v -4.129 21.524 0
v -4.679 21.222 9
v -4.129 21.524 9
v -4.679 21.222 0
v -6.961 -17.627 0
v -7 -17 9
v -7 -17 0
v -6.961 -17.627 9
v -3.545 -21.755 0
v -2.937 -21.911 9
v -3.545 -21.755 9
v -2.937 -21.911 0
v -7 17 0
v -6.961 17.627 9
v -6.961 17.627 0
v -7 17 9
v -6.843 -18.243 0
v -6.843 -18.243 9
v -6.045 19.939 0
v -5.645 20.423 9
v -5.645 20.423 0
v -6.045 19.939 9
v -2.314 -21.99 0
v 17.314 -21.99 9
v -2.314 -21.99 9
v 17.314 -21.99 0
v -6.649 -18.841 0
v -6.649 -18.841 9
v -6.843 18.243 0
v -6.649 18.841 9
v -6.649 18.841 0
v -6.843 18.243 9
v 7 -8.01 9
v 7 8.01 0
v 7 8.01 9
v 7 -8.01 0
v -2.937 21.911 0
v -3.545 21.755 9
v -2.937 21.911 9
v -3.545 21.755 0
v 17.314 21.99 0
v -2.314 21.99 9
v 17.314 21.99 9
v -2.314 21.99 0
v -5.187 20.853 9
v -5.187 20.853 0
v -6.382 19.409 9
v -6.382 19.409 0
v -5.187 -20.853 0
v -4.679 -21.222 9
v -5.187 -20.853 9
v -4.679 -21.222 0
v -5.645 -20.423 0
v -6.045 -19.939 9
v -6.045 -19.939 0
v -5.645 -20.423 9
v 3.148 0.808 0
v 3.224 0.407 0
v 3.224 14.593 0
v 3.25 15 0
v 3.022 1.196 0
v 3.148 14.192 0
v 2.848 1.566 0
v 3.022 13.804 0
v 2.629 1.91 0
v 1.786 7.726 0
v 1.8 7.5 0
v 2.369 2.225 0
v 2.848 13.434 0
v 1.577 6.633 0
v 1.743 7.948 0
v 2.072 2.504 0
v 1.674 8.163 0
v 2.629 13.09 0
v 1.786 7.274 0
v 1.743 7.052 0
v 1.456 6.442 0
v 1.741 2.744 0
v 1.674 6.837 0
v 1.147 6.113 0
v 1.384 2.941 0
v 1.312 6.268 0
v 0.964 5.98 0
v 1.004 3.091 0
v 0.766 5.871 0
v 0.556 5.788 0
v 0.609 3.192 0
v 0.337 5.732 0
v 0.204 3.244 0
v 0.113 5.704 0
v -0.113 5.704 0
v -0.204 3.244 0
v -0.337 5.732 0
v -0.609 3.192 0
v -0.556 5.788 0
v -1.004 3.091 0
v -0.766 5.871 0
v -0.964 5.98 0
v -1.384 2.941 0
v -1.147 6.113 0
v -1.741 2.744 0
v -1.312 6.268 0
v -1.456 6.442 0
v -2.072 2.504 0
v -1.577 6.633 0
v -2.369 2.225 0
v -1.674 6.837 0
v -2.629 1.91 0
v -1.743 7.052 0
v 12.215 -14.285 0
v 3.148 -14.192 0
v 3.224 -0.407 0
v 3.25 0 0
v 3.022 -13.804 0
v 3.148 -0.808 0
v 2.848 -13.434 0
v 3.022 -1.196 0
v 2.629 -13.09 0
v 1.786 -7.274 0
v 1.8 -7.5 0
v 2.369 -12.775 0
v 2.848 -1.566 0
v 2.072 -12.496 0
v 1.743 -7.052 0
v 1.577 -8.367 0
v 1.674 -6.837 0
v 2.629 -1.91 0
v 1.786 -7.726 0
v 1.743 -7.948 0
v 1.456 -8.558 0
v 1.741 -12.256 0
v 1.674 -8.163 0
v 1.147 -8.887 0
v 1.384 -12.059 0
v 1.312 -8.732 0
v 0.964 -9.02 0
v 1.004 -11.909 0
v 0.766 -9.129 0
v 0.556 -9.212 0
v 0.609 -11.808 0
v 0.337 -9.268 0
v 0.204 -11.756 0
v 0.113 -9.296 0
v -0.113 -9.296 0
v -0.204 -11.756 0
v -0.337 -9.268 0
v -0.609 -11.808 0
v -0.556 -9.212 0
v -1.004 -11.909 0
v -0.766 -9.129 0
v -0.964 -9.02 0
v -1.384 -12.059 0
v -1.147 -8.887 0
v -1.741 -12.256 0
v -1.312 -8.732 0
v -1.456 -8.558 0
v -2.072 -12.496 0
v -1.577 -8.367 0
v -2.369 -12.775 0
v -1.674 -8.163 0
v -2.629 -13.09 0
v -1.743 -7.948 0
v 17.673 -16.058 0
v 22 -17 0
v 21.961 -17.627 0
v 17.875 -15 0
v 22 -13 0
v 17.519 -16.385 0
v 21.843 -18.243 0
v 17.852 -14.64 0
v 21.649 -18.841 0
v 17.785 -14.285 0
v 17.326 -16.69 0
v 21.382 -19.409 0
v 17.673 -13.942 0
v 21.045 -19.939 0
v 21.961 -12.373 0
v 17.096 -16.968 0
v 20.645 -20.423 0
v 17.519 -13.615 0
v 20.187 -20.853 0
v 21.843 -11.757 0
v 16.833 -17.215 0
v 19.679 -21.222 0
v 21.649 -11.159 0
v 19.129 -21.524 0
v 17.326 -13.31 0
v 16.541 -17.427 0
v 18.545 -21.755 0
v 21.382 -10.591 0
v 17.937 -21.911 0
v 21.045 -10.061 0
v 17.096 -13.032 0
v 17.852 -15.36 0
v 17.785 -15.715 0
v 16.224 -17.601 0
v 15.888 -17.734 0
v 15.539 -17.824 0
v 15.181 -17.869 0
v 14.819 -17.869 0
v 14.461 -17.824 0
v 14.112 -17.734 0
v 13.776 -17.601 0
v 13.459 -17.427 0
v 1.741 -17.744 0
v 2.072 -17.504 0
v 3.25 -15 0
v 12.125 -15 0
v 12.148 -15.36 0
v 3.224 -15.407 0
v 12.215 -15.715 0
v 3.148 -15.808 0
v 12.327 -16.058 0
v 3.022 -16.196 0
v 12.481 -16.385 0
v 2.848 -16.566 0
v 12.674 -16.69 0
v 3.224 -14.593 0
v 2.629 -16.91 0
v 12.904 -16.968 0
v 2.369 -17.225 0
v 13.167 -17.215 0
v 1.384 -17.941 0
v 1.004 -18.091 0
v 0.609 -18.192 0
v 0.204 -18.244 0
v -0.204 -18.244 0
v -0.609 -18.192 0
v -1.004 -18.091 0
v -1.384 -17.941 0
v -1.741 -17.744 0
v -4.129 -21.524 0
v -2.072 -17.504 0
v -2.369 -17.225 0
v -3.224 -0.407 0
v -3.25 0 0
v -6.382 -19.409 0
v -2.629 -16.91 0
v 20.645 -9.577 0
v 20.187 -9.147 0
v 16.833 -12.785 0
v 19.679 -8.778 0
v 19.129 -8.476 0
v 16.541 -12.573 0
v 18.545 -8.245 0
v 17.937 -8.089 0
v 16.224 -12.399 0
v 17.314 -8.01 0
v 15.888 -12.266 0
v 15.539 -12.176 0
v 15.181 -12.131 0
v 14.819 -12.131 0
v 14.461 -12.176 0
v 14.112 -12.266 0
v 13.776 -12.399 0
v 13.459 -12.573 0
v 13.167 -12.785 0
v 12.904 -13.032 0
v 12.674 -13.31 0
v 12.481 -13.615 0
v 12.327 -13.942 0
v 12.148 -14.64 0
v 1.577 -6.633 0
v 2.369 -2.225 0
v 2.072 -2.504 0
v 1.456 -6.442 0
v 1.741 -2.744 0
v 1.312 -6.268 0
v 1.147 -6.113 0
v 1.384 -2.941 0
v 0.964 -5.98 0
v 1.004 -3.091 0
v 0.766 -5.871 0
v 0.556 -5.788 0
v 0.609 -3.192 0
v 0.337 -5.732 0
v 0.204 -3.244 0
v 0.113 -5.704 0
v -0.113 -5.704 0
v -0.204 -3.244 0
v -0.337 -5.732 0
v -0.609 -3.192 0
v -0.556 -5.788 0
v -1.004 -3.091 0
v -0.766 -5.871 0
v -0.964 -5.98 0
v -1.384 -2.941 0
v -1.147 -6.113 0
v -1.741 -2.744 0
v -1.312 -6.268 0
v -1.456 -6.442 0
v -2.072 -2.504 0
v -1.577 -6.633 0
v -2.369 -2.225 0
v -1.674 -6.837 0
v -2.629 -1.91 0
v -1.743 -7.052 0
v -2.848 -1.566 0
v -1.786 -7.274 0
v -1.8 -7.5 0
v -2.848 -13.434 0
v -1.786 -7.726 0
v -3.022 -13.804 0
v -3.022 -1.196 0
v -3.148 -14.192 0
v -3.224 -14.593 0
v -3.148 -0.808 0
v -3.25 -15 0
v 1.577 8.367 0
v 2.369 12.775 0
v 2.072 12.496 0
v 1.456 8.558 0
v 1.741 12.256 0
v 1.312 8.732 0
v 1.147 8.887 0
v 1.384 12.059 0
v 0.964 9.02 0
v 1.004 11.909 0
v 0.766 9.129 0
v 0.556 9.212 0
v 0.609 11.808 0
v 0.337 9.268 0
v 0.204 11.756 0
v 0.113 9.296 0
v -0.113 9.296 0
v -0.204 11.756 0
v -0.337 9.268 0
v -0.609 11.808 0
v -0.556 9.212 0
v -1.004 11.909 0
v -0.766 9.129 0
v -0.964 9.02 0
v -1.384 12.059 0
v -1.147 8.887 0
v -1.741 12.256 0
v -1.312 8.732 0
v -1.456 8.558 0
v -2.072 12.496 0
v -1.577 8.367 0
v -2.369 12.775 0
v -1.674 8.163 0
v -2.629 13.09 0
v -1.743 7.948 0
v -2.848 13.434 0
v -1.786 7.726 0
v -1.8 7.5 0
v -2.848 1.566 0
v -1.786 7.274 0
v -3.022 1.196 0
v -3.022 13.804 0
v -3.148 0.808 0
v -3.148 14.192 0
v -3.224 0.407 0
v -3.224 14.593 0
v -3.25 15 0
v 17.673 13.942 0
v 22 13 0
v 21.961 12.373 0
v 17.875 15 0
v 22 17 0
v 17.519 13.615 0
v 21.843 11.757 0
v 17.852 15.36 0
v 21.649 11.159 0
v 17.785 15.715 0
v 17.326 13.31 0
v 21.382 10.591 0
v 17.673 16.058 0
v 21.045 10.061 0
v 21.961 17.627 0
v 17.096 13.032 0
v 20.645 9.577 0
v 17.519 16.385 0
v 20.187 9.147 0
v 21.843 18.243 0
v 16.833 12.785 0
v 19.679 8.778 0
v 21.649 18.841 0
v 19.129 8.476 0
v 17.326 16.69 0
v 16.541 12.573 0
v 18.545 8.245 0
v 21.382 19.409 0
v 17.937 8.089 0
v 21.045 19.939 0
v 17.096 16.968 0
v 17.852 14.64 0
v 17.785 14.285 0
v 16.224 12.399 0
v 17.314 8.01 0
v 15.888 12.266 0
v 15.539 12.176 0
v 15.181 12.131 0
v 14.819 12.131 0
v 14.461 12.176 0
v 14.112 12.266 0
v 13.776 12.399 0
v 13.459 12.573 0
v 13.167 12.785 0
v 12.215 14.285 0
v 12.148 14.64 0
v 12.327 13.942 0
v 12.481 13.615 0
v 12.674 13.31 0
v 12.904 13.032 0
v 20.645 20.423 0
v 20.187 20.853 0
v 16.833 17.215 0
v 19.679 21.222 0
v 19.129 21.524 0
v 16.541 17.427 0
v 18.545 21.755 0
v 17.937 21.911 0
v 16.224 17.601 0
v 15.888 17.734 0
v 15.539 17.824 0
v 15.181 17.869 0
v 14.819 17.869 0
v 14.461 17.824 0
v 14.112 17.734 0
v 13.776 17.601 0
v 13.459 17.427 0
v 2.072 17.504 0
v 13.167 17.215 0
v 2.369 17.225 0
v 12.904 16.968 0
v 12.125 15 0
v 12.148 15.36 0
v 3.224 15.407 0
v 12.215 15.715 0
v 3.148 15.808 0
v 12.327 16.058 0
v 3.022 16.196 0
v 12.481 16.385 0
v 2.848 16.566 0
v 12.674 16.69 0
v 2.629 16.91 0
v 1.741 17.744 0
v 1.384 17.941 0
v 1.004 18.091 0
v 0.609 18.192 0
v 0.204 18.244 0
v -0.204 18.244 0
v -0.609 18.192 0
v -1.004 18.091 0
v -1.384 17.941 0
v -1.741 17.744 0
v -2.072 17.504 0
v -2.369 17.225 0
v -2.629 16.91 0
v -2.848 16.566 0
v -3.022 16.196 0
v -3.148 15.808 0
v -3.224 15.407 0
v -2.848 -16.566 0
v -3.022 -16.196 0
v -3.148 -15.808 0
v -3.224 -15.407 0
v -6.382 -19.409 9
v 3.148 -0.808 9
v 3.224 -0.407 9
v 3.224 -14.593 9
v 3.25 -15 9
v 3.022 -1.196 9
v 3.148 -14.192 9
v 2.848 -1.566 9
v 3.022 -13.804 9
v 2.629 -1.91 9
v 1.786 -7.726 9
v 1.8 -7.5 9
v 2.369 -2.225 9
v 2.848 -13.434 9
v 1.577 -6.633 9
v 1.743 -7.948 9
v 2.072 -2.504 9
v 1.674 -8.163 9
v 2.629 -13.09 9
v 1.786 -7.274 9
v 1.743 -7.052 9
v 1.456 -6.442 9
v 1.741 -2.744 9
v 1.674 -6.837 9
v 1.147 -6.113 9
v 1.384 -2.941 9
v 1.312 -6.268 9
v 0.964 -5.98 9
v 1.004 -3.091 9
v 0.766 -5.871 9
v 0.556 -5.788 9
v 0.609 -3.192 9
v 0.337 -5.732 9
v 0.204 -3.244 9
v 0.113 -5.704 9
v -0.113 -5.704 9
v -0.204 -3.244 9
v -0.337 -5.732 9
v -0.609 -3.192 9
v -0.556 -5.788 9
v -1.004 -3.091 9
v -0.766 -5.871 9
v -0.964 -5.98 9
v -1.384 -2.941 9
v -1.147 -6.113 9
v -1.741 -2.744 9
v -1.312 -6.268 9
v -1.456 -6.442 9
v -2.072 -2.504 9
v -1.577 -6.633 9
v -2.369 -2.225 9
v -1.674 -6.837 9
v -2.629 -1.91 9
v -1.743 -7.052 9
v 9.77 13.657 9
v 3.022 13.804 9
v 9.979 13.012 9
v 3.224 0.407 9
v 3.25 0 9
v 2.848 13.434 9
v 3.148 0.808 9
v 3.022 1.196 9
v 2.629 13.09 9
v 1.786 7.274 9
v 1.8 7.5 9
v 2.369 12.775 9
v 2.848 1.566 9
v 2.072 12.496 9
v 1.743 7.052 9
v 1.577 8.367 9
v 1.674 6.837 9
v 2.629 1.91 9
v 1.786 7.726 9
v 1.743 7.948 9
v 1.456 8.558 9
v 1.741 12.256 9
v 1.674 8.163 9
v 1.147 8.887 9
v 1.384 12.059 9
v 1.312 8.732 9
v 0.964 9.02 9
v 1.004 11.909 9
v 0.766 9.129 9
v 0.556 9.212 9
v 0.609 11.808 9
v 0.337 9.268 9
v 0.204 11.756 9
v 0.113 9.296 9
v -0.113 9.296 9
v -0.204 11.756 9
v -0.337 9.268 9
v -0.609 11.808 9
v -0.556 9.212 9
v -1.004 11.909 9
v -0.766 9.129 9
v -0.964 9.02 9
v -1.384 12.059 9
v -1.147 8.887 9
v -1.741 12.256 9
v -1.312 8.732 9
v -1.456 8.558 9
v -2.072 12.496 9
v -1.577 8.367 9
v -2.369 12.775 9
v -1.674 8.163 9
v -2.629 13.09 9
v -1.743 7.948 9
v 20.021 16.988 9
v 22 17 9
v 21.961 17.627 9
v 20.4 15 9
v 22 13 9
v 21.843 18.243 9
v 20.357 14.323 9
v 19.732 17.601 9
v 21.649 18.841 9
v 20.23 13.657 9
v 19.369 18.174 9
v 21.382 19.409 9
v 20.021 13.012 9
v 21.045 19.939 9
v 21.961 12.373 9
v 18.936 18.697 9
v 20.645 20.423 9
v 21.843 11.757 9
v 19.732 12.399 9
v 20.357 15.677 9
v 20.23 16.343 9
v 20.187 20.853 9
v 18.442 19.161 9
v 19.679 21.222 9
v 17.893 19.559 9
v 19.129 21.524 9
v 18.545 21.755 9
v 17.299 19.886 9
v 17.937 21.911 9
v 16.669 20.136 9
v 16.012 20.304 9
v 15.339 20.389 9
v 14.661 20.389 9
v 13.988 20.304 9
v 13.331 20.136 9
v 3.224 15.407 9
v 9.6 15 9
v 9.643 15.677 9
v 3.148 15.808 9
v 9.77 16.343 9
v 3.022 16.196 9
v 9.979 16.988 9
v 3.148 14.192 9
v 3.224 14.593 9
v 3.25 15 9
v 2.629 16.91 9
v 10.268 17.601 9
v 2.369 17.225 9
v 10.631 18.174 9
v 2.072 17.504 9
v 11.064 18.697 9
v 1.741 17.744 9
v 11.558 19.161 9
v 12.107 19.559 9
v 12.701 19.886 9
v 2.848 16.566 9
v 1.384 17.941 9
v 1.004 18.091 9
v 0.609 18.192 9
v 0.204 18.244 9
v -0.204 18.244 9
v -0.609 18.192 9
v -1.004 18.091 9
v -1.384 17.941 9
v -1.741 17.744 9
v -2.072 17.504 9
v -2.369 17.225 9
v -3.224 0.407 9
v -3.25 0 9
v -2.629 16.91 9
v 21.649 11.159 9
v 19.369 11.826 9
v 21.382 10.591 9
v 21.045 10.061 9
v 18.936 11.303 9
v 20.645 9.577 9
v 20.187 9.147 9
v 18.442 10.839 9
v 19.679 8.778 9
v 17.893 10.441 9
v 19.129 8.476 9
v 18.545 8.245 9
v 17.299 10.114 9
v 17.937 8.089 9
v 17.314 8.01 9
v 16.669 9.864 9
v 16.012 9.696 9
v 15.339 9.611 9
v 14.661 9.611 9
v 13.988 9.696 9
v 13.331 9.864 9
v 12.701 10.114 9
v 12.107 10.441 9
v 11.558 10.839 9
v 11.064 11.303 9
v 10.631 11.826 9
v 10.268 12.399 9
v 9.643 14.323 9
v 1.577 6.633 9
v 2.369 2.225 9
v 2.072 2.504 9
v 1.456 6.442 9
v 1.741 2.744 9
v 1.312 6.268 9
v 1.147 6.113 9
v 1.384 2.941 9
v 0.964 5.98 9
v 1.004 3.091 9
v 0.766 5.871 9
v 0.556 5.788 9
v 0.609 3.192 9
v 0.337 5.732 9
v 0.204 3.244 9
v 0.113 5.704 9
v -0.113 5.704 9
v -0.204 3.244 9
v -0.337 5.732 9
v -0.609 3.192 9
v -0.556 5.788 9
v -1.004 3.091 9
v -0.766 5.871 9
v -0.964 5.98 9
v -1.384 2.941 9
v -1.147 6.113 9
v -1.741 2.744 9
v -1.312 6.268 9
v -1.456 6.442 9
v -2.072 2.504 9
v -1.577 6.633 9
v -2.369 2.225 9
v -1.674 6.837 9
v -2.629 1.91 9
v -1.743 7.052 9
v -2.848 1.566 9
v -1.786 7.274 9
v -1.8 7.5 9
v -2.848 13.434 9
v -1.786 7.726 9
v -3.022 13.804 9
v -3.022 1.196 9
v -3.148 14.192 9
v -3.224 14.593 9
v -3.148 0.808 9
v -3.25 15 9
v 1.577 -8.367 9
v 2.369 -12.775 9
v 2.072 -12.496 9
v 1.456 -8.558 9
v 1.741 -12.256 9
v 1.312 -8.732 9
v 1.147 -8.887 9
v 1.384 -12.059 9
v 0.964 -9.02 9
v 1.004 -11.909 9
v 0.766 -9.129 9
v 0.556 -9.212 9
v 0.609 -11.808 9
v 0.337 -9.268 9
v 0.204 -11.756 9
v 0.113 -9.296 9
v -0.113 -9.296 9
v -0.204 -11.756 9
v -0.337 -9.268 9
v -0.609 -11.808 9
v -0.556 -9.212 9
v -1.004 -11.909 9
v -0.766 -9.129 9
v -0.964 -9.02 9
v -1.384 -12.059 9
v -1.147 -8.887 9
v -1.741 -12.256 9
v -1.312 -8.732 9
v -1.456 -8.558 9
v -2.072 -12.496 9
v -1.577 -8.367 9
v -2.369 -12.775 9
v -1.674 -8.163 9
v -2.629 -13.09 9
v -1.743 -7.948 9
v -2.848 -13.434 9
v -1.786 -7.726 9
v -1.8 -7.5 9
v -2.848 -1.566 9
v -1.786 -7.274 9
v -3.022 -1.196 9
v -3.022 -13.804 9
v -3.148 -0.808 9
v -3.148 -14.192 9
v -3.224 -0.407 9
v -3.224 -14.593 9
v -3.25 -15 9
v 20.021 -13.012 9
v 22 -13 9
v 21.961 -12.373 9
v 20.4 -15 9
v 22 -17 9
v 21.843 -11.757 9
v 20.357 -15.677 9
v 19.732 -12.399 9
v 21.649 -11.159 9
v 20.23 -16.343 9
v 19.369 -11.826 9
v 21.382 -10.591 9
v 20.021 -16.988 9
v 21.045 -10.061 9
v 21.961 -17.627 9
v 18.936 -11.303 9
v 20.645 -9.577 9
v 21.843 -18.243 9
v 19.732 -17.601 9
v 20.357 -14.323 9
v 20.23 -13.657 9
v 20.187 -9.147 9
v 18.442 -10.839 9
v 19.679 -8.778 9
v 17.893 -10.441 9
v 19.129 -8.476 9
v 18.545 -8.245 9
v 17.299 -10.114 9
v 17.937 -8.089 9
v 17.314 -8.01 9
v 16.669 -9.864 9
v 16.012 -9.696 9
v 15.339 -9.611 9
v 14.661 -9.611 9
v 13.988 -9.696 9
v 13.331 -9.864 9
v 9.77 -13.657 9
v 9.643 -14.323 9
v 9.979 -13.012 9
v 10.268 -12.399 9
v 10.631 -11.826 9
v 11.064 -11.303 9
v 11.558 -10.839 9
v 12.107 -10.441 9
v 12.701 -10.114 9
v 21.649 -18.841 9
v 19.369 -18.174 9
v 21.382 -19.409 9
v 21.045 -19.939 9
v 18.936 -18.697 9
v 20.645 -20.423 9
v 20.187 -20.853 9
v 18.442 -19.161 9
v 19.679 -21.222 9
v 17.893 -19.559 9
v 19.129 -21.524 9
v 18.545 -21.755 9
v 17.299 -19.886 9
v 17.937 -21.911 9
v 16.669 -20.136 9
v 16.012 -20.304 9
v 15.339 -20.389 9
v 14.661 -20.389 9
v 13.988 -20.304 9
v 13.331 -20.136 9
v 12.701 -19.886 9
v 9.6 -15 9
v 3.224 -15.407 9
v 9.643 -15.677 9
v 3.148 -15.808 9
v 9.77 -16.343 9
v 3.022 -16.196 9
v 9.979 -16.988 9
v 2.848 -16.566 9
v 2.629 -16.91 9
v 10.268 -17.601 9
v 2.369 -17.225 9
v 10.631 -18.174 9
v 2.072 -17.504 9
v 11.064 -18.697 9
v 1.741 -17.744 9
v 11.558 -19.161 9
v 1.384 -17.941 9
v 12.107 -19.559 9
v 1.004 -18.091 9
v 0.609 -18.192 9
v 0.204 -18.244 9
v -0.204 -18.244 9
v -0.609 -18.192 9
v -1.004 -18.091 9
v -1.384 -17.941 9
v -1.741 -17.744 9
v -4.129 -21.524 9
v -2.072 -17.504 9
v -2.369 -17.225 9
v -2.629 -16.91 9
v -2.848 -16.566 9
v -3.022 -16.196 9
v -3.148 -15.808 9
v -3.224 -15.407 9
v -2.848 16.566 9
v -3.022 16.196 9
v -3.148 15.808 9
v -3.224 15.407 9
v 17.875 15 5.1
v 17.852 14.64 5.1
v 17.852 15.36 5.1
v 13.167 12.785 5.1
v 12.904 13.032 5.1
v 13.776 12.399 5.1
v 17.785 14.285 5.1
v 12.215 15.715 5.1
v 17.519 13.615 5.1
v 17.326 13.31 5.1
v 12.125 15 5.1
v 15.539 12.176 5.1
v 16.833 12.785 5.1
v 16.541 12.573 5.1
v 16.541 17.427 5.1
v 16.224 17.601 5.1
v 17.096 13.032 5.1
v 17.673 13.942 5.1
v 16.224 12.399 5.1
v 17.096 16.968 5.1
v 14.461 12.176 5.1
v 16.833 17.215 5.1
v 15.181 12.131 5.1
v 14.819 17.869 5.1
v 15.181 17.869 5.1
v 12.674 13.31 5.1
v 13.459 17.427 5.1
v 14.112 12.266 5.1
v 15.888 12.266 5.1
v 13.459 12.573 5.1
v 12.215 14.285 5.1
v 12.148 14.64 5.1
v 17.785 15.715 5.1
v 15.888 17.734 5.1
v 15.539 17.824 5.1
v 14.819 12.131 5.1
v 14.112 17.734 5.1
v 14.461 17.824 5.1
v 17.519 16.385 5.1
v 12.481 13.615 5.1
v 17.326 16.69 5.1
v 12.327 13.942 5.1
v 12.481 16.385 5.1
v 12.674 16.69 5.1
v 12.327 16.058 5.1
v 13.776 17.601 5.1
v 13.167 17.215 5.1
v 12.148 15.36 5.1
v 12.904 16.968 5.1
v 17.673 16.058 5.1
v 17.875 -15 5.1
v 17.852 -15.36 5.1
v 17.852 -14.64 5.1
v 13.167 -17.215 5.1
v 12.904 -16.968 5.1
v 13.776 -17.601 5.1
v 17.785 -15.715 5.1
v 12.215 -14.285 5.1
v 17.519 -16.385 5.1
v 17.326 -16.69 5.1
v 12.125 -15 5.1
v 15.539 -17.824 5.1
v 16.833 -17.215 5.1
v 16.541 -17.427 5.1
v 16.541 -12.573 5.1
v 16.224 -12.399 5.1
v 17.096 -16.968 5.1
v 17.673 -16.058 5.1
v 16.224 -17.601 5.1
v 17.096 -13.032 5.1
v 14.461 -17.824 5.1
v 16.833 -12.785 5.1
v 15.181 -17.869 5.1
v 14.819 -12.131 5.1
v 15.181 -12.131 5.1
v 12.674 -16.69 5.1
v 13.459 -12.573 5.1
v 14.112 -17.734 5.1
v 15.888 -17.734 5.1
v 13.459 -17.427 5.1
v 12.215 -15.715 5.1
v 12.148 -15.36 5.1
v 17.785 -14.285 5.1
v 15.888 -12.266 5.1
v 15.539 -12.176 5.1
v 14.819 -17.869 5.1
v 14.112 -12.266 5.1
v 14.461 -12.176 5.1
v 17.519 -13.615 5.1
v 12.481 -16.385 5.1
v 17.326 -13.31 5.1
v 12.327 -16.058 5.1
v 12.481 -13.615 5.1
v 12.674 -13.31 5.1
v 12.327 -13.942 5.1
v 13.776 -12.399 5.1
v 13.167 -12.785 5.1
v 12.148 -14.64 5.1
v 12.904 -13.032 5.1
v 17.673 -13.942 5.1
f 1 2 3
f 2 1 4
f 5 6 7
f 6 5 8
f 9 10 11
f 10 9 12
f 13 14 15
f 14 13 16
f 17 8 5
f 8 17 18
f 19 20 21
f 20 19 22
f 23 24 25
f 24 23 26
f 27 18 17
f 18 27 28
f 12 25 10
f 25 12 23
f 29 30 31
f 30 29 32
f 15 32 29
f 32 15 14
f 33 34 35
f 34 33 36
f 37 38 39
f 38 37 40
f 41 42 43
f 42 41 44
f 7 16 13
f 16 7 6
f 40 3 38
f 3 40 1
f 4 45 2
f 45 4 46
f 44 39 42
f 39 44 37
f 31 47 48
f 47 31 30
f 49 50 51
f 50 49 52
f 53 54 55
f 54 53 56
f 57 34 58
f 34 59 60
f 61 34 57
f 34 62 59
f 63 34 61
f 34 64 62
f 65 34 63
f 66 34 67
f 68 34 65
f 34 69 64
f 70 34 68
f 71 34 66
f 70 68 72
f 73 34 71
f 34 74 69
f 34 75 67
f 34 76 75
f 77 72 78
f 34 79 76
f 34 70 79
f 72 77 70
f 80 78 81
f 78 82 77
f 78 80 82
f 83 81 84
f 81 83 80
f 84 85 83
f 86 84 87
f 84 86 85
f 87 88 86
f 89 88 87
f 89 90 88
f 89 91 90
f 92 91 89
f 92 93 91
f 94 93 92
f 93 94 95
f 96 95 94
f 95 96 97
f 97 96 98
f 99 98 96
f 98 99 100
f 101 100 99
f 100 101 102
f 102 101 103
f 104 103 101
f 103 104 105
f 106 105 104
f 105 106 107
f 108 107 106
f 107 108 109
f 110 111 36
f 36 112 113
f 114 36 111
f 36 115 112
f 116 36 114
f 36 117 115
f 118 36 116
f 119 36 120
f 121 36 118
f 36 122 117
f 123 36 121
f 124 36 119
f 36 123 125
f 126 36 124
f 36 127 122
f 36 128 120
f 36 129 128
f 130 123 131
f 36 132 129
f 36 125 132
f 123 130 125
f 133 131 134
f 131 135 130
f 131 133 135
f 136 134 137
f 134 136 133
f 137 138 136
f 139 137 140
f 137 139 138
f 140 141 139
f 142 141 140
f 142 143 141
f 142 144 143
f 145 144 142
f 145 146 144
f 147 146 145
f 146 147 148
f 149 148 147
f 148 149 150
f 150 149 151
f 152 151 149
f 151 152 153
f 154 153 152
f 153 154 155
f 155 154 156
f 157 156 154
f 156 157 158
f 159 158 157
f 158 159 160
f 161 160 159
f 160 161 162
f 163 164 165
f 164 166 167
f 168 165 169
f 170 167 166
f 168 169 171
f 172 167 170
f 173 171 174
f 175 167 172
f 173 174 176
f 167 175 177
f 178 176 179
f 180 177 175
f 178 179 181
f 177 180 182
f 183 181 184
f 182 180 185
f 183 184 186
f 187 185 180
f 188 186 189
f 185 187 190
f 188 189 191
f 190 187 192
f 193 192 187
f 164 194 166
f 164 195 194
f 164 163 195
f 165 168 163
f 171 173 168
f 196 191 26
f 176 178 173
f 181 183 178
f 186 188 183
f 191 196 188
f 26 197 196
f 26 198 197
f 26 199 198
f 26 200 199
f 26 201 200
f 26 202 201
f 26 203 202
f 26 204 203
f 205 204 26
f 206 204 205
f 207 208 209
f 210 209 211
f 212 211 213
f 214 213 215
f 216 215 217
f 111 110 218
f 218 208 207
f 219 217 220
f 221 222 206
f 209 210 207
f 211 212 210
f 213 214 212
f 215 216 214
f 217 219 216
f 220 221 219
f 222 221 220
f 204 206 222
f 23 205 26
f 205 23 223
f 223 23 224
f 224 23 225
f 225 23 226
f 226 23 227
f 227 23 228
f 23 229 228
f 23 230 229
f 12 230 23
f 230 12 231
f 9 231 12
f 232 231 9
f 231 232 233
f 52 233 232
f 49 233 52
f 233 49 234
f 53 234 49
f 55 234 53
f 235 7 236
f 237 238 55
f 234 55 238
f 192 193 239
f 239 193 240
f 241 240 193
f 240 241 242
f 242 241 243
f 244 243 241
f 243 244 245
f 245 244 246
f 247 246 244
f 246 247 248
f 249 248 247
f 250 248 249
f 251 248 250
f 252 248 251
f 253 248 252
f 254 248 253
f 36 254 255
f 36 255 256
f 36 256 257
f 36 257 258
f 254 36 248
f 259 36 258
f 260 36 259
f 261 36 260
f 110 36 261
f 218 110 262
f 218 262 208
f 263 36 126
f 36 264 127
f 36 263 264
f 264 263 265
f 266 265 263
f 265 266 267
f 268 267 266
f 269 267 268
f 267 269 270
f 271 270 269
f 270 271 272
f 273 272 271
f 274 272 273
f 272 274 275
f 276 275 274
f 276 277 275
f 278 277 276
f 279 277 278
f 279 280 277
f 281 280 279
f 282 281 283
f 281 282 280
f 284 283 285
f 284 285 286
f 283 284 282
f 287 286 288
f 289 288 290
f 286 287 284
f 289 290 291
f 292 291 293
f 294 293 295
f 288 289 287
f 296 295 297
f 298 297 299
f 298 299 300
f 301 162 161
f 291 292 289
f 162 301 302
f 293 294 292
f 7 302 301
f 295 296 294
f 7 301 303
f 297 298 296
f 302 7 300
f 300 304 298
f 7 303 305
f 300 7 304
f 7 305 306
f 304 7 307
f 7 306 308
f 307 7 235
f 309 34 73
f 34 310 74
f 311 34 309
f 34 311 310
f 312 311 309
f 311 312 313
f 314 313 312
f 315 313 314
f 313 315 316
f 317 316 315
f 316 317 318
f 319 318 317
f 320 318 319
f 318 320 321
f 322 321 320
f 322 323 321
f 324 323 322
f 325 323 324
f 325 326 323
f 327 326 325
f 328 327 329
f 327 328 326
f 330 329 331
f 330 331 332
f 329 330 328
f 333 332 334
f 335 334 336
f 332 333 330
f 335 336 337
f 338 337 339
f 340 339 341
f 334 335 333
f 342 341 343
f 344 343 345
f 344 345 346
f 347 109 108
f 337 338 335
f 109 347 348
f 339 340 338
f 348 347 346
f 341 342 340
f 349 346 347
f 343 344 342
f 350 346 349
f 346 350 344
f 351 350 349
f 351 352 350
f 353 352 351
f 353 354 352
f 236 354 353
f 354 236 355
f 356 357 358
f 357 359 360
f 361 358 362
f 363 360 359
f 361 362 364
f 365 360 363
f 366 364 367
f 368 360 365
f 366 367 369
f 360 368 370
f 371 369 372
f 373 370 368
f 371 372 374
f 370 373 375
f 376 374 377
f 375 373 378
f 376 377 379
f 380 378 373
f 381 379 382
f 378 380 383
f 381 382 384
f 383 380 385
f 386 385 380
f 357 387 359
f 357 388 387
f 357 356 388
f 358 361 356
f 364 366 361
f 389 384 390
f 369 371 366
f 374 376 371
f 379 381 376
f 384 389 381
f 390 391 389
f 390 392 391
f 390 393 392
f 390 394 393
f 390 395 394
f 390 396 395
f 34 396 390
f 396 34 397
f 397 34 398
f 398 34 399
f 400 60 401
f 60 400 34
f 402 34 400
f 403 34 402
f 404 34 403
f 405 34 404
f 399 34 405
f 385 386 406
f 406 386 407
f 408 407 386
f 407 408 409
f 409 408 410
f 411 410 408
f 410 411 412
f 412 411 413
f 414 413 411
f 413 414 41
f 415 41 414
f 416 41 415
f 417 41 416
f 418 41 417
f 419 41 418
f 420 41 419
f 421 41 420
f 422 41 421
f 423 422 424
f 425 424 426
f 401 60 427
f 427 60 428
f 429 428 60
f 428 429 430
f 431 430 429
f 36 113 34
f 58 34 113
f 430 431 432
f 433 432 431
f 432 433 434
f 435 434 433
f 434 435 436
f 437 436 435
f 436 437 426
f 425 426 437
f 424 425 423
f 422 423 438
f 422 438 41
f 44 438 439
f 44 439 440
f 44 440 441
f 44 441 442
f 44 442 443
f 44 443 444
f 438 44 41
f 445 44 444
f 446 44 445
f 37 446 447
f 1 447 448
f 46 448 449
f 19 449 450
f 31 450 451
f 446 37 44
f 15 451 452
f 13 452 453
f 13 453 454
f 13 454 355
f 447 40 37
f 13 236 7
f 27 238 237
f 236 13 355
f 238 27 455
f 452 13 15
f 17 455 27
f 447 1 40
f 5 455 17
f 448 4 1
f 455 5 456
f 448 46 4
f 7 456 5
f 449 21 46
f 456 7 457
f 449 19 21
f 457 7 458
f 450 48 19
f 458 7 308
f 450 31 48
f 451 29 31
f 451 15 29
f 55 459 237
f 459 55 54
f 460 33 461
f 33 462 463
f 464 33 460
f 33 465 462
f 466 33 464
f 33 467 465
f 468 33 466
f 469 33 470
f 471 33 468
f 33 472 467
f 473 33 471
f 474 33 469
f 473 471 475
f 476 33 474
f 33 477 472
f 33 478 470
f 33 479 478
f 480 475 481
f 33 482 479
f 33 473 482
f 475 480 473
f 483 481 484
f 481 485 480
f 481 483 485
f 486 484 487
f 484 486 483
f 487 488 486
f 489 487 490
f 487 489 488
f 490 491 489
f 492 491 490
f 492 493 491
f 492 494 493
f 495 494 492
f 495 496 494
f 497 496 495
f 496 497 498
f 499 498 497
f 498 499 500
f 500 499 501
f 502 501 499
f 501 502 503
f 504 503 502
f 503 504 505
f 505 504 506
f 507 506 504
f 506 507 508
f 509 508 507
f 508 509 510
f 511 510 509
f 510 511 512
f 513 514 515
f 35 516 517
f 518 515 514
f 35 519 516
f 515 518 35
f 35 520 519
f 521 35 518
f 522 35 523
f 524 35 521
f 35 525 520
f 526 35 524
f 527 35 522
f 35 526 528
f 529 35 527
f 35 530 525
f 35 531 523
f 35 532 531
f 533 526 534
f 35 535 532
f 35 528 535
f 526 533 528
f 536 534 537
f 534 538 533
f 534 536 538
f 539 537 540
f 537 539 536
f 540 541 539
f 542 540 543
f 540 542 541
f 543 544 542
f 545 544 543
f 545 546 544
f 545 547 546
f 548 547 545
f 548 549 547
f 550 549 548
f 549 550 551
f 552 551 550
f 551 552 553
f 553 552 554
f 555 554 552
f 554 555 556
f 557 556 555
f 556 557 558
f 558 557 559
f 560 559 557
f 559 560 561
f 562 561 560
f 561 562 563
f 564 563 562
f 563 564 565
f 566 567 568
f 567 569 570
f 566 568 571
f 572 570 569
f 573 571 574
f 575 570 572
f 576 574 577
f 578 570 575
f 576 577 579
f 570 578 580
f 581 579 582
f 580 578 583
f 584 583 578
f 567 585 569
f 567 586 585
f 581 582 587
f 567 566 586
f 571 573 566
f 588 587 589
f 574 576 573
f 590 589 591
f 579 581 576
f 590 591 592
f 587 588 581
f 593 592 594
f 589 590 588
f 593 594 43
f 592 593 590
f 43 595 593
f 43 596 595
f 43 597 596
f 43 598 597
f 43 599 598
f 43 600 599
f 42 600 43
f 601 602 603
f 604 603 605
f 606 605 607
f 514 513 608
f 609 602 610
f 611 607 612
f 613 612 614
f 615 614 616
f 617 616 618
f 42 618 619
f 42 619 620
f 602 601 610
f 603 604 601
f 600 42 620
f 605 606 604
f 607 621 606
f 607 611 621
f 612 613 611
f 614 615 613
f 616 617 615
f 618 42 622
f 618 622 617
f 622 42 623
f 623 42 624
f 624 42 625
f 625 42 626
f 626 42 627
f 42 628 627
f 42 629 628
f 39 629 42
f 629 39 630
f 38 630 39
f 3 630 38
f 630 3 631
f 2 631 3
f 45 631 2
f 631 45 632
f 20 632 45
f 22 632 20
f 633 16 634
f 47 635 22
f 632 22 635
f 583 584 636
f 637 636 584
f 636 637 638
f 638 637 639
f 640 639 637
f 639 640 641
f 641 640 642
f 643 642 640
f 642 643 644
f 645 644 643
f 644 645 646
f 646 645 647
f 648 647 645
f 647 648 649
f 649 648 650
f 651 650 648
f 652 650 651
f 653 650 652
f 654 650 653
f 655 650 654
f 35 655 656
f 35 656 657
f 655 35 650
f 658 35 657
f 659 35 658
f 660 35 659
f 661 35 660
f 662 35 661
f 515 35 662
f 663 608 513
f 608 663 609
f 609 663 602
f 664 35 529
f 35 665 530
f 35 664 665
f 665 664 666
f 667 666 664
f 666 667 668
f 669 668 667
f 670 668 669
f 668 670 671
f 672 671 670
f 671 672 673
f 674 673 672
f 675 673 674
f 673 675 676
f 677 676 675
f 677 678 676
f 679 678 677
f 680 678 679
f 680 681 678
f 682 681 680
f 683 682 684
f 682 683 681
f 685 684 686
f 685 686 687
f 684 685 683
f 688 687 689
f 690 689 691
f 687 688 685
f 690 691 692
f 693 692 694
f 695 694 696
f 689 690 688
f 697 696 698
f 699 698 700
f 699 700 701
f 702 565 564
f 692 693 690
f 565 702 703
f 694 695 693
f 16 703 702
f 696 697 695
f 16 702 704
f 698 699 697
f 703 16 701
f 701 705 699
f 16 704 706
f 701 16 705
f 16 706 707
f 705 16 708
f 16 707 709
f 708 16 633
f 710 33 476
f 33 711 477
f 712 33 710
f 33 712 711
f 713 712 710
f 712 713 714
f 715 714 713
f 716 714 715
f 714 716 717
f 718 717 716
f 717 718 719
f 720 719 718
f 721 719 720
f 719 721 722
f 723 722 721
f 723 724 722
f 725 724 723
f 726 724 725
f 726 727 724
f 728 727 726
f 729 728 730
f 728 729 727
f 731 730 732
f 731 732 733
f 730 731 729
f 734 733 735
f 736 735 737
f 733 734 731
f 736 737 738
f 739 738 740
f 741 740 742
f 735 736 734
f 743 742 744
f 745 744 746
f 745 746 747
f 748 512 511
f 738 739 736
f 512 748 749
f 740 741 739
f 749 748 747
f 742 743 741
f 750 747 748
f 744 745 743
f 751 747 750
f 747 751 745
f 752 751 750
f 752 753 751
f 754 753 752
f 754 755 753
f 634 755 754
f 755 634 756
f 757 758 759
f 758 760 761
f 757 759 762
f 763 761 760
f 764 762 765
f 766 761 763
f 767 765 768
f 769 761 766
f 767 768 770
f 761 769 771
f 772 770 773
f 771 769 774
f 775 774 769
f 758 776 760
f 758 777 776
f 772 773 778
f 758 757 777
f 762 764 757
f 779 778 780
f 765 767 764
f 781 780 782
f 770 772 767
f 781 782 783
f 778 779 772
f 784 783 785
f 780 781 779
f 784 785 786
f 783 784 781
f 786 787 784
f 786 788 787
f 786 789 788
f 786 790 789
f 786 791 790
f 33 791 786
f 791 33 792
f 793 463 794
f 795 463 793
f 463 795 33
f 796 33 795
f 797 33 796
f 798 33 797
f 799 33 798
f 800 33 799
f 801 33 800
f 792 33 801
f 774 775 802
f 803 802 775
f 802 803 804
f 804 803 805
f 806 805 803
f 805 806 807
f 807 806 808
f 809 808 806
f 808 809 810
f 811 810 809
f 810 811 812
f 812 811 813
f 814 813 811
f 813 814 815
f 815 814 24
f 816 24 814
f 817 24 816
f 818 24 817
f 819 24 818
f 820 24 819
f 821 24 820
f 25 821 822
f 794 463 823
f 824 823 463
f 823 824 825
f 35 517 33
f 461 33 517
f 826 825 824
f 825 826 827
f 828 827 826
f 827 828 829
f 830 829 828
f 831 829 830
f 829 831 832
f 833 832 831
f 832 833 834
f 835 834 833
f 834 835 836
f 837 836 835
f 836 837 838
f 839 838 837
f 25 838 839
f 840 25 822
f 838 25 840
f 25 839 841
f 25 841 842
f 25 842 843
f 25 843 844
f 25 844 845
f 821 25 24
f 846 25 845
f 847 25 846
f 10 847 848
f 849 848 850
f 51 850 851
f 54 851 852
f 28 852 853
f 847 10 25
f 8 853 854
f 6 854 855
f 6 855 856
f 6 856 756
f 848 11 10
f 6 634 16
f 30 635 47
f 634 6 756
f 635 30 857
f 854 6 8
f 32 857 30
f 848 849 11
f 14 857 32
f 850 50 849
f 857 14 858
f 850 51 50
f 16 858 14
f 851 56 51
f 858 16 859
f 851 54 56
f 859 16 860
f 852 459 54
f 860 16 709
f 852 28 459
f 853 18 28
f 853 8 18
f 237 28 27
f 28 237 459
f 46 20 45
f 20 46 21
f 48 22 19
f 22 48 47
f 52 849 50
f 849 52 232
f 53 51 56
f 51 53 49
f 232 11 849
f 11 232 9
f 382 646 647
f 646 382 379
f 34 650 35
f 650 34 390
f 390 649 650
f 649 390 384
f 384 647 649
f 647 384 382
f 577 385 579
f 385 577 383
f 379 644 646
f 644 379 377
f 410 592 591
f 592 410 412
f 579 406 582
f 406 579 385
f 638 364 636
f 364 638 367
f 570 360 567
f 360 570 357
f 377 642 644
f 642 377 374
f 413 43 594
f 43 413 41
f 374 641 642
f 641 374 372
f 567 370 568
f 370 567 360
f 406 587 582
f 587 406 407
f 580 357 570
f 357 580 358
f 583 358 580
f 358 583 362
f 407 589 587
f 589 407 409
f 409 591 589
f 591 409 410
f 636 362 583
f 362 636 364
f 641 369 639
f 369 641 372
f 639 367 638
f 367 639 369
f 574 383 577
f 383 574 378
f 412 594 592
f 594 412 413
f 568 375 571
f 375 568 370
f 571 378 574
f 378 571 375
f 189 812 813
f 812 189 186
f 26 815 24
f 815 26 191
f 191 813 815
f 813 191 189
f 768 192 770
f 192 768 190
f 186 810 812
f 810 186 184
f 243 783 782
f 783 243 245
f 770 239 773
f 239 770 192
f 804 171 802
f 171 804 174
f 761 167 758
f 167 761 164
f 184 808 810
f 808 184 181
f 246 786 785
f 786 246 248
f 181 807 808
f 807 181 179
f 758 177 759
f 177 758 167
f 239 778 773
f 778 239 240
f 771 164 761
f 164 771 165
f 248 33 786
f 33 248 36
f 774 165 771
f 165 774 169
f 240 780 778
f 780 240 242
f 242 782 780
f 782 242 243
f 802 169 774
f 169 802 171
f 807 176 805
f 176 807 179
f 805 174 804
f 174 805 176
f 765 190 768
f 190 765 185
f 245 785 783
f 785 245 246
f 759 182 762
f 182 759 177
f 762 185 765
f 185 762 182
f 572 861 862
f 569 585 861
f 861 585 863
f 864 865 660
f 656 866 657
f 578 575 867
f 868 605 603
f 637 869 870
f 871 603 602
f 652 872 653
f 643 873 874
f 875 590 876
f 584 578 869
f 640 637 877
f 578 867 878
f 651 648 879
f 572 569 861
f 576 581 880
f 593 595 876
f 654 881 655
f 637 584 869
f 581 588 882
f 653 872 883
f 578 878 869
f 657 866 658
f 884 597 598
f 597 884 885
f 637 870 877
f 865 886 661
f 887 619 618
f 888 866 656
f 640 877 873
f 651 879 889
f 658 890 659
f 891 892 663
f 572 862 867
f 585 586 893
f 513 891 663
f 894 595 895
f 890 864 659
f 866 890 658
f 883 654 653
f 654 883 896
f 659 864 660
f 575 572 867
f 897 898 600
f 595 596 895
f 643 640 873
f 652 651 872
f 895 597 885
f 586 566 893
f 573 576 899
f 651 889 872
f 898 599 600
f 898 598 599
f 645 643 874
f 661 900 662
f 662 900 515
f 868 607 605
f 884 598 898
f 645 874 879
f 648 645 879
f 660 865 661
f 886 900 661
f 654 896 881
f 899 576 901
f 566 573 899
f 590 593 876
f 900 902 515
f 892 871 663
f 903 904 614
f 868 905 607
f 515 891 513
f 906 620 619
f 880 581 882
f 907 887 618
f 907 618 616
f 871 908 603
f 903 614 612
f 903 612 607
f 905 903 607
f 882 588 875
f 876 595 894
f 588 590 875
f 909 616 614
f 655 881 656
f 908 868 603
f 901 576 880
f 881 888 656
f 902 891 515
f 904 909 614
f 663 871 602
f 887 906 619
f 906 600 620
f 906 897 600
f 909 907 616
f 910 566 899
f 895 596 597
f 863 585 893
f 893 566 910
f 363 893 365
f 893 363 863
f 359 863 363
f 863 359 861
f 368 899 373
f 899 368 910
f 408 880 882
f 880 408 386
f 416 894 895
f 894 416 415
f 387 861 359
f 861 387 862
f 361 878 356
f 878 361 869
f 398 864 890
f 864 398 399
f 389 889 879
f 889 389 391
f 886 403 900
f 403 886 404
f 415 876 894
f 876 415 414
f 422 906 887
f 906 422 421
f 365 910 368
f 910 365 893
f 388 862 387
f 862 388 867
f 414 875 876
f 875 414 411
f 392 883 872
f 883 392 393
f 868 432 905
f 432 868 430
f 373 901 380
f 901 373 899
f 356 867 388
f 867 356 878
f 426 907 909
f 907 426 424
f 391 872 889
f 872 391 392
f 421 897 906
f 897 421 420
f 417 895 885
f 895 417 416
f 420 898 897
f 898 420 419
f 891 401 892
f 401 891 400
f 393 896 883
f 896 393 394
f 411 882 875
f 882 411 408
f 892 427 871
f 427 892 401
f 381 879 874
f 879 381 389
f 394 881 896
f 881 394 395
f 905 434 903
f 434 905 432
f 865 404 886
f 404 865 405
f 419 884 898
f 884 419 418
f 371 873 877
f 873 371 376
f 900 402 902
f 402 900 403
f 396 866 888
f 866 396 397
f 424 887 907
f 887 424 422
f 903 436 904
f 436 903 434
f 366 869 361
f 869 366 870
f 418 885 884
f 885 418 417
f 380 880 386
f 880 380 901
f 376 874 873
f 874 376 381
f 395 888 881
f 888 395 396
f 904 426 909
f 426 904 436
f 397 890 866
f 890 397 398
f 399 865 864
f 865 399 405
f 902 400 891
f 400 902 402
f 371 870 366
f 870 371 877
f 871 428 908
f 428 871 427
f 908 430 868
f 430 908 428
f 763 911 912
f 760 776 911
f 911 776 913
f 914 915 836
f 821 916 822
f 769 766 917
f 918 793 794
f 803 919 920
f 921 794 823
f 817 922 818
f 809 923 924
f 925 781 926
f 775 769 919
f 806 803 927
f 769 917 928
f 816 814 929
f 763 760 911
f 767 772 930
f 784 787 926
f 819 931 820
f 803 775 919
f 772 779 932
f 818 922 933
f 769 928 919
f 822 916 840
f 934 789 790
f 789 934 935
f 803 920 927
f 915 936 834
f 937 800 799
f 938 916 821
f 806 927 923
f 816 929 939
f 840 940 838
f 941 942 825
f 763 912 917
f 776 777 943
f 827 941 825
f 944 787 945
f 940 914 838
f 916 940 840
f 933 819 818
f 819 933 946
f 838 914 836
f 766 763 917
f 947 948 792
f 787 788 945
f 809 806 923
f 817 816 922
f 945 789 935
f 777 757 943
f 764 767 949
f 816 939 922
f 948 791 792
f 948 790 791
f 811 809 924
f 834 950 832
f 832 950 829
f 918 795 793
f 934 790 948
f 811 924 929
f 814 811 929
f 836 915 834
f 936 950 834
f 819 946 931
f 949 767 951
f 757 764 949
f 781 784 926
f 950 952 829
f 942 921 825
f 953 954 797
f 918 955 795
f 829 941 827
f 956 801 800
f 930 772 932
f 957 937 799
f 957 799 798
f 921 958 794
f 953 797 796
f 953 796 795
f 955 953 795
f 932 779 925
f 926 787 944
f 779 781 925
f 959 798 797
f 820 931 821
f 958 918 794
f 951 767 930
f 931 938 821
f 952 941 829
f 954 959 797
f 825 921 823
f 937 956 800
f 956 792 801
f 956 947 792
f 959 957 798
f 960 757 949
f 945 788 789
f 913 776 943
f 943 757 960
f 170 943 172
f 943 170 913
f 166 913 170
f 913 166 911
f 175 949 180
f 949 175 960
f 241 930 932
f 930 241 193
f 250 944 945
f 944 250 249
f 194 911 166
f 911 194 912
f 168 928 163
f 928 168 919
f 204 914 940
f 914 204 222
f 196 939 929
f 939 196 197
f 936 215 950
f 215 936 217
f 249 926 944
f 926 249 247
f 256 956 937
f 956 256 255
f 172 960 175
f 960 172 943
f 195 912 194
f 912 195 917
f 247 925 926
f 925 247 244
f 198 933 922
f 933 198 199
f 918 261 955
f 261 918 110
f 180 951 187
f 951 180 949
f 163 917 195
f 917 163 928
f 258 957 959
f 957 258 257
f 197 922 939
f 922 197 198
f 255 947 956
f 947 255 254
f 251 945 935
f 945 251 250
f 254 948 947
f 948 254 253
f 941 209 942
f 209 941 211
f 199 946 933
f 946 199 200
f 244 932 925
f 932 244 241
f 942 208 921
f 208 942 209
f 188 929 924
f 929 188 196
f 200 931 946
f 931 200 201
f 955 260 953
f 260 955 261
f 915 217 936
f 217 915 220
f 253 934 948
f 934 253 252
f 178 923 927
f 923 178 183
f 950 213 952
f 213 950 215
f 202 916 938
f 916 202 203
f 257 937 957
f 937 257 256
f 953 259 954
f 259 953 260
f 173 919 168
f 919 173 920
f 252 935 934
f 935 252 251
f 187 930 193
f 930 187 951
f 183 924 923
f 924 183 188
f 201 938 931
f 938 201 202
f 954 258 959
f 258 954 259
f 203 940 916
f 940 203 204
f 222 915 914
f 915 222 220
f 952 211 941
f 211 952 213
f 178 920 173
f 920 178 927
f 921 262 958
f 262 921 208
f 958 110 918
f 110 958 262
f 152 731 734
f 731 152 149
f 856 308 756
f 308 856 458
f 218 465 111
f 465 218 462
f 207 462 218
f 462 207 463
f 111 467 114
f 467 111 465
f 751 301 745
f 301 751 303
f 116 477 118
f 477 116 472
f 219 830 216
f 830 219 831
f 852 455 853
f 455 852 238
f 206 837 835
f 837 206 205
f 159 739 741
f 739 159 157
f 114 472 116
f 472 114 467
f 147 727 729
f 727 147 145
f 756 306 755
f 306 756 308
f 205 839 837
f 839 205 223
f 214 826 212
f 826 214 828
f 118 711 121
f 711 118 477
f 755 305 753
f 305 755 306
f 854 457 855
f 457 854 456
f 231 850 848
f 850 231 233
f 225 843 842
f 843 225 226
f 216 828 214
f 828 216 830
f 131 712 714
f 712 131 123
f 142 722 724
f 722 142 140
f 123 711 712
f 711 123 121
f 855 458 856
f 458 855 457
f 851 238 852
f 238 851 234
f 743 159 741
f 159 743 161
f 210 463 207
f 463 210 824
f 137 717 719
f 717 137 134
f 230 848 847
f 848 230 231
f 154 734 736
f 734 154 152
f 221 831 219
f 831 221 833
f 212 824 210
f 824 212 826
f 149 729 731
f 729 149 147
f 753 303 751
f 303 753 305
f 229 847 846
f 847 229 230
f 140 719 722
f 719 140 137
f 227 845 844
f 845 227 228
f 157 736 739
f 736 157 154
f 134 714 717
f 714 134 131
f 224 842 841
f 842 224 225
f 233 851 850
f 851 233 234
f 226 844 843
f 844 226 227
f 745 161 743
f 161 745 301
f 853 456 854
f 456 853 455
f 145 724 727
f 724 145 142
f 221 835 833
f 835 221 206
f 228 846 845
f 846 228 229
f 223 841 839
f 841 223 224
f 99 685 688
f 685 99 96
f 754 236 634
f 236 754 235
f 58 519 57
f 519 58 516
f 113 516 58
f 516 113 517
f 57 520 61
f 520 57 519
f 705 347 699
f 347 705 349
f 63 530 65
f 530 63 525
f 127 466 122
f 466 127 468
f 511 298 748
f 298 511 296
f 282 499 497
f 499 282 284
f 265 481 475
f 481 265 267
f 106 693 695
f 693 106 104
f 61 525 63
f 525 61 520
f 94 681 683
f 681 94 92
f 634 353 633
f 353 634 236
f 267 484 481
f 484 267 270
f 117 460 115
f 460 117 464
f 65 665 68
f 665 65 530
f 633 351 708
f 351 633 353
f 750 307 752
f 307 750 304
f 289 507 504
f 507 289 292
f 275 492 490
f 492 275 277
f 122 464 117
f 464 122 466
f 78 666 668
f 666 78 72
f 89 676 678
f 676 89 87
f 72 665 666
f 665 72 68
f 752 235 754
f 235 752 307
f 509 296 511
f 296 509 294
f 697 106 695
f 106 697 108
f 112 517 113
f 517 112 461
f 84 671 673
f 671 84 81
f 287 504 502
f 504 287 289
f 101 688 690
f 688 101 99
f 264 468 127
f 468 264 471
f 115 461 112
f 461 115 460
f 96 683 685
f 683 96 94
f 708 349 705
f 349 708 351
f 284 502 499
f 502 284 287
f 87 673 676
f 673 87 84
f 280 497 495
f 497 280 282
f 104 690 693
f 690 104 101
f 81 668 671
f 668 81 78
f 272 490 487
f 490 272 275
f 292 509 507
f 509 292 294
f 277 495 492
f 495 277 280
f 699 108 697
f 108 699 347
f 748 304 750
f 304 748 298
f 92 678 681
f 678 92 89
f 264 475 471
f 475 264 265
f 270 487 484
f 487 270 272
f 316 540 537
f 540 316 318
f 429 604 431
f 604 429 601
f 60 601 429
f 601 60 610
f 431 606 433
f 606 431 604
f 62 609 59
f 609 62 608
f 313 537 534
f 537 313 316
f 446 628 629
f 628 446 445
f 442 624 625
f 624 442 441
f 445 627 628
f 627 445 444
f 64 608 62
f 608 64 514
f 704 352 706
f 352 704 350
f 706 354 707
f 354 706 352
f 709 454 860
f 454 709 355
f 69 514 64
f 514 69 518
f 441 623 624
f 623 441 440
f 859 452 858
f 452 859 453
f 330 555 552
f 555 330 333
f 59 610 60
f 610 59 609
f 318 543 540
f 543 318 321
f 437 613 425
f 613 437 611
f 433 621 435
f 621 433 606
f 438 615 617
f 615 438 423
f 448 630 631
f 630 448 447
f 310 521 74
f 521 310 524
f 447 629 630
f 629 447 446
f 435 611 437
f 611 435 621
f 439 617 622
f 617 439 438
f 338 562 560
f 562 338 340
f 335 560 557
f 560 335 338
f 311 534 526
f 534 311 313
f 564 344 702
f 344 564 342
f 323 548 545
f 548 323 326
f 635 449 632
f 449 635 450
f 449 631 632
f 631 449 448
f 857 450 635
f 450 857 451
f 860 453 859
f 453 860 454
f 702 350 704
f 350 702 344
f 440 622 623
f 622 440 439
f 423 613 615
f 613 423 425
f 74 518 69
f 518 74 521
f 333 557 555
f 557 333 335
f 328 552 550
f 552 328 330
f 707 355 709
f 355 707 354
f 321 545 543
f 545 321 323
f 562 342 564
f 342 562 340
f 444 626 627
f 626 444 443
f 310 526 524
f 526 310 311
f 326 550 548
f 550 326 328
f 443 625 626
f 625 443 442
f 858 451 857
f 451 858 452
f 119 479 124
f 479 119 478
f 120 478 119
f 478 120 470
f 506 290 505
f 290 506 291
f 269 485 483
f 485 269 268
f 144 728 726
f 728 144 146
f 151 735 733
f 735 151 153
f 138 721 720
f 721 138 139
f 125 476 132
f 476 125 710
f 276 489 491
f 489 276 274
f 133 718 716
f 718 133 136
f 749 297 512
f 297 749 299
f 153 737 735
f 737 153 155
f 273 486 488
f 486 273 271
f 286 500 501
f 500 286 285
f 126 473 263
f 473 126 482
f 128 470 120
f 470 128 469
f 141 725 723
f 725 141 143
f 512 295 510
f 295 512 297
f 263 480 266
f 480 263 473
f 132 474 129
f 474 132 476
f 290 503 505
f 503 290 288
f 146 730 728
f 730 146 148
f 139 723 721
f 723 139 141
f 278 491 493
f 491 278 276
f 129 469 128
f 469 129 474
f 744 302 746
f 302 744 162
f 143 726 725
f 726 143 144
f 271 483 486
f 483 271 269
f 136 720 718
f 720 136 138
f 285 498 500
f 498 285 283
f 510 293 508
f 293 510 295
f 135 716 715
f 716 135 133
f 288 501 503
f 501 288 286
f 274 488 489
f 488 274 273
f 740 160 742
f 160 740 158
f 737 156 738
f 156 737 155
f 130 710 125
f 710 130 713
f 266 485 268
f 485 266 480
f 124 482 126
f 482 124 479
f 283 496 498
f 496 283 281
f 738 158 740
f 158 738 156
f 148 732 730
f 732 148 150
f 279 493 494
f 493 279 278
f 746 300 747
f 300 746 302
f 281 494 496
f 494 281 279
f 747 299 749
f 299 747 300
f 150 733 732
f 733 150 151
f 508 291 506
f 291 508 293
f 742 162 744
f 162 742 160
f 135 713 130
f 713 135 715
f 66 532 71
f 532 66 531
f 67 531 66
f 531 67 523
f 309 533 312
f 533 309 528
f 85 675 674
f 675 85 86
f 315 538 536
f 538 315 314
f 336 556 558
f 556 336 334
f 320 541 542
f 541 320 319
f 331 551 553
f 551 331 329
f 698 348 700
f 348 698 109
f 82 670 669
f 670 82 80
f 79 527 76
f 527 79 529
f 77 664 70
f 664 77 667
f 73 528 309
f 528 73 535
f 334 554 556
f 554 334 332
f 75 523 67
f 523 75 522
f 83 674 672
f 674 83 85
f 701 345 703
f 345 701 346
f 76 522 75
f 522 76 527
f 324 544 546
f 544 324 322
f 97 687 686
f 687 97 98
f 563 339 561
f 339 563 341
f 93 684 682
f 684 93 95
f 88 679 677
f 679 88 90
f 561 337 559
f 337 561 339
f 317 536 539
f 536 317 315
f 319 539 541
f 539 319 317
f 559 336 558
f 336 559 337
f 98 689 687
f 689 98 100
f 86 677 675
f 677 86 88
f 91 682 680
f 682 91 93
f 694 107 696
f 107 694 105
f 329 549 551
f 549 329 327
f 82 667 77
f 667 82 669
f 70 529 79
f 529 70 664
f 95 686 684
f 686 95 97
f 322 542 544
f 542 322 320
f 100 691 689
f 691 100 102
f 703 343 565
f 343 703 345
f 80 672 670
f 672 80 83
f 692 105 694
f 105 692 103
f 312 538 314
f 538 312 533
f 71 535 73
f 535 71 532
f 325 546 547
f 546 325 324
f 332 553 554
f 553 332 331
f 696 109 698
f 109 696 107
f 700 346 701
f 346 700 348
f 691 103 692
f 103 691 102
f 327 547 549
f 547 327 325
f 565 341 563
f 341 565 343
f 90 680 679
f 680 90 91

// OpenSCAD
$fn = 50;


difference() {
	union() {
		hull() {
			translate(v = [-2.0000000000, 17.0000000000, 0]) {
				cylinder(h = 9, r = 5);
			}
			translate(v = [2.0000000000, 17.0000000000, 0]) {
				cylinder(h = 9, r = 5);
			}
			translate(v = [-2.0000000000, -17.0000000000, 0]) {
				cylinder(h = 9, r = 5);
			}
			translate(v = [2.0000000000, -17.0000000000, 0]) {
				cylinder(h = 9, r = 5);
			}
		}
		translate(v = [7.5000000000, 15.0000000000, 0]) {
			hull() {
				translate(v = [-9.5000000000, 2.0000000000, 0]) {
					cylinder(h = 9, r = 5);
				}
				translate(v = [9.5000000000, 2.0000000000, 0]) {
					cylinder(h = 9, r = 5);
				}
				translate(v = [-9.5000000000, -2.0000000000, 0]) {
					cylinder(h = 9, r = 5);
				}
				translate(v = [9.5000000000, -2.0000000000, 0]) {
					cylinder(h = 9, r = 5);
				}
			}
		}
		translate(v = [7.5000000000, -15.0000000000, 0]) {
			hull() {
				translate(v = [-9.5000000000, 2.0000000000, 0]) {
					cylinder(h = 9, r = 5);
				}
				translate(v = [9.5000000000, 2.0000000000, 0]) {
					cylinder(h = 9, r = 5);
				}
				translate(v = [-9.5000000000, -2.0000000000, 0]) {
					cylinder(h = 9, r = 5);
				}
				translate(v = [9.5000000000, -2.0000000000, 0]) {
					cylinder(h = 9, r = 5);
				}
			}
		}
	}
	union() {
		translate(v = [15.0000000000, 15.0000000000, 9]) {
			rotate(a = [0, 0, 0]) {
				difference() {
					union() {
						#translate(v = [0, 0, -9.0000000000]) {
							cylinder(h = 9, r = 2.6000000000);
						}
						#translate(v = [0, 0, -3.9000000000]) {
							cylinder(h = 3.9000000000, r1 = 2.8750000000, r2 = 5.4000000000);
						}
						#translate(v = [0, 0, -9.0000000000]) {
							cylinder(h = 9, r = 2.8750000000);
						}
						#translate(v = [0, 0, -9.0000000000]) {
							cylinder(h = 9, r = 2.6000000000);
						}
					}
					union();
				}
			}
		}
		translate(v = [15.0000000000, -15.0000000000, 9]) {
			rotate(a = [0, 0, 0]) {
				difference() {
					union() {
						#translate(v = [0, 0, -9.0000000000]) {
							cylinder(h = 9, r = 2.6000000000);
						}
						#translate(v = [0, 0, -3.9000000000]) {
							cylinder(h = 3.9000000000, r1 = 2.8750000000, r2 = 5.4000000000);
						}
						#translate(v = [0, 0, -9.0000000000]) {
							cylinder(h = 9, r = 2.8750000000);
						}
						#translate(v = [0, 0, -9.0000000000]) {
							cylinder(h = 9, r = 2.6000000000);
						}
					}
					union();
				}
			}
		}
		translate(v = [0.0000000000, -15.0000000000, 0]) {
			translate(v = [0, 0, -100]) {
				cylinder(h = 200, r = 3.2500000000);
			}
		}
		translate(v = [0, 0, -100]) {
			cylinder(h = 200, r = 3.2500000000);
		}
		translate(v = [0.0000000000, 15.0000000000, 0]) {
			translate(v = [0, 0, -100]) {
				cylinder(h = 200, r = 3.2500000000);
			}
		}
		translate(v = [0.0000000000, -15.0000000000, 0]) {
			translate(v = [0, 0, -100]) {
				cylinder(h = 200, r = 1.8000000000);
			}
		}
		translate(v = [0.0000000000, -7.5000000000, 0]) {
			translate(v = [0, 0, -100]) {
				cylinder(h = 200, r = 1.8000000000);
			}
		}
		translate(v = [0, 0, -100]) {
			cylinder(h = 200, r = 1.8000000000);
		}
		translate(v = [0.0000000000, 7.5000000000, 0]) {
			translate(v = [0, 0, -100]) {
				cylinder(h = 200, r = 1.8000000000);
			}
		}
		translate(v = [0.0000000000, 15.0000000000, 0]) {
			translate(v = [0, 0, -100]) {
				cylinder(h = 200, r = 1.8000000000);
			}
		}
	}
}
